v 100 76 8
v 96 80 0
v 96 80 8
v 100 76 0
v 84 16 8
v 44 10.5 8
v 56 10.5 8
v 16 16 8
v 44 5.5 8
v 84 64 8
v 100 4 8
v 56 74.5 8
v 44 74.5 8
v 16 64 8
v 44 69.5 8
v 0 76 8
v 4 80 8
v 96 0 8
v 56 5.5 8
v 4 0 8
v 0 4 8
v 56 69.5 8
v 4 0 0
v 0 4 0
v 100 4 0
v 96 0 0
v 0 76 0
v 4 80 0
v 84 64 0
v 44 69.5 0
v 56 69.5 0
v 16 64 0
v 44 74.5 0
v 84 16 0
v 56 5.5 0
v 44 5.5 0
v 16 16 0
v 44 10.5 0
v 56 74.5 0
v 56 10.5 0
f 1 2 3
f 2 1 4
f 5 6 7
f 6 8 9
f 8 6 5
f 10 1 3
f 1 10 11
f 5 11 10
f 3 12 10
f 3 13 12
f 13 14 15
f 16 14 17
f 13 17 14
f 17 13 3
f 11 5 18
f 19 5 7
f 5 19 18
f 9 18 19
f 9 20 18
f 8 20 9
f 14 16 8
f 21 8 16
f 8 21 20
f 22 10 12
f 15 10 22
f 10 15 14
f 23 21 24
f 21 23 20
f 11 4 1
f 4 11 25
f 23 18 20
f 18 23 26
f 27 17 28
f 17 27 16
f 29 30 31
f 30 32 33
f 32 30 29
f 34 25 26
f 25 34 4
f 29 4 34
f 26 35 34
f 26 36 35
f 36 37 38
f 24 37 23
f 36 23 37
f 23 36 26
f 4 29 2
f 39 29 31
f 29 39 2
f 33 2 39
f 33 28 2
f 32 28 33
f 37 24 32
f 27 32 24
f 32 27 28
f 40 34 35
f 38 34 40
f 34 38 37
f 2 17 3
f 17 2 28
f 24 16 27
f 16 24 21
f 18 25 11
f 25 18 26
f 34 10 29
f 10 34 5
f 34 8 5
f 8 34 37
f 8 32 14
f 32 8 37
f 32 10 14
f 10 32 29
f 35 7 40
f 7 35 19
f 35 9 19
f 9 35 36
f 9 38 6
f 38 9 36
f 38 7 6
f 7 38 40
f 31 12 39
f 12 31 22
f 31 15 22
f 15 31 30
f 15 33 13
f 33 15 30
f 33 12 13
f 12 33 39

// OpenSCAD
$fn = 32;

// ----------------------------------------------------------------------
// Frame plate: 100 x 80 frame, 16 mm rails
// ----------------------------------------------------------------------

// --- parameters (mm) ---
plate_l = 100;            // plate length, X
plate_w = 80;             // plate width, Y
plate_t = 8;              // plate thickness, Z (extrusion height)
corner_c = 4;             // corner chamfer
frame_bar = 16;           // frame rail width
slot_l = 12;              // adjustment slot length
slot_w = 5;               // adjustment slot width

win_l = plate_l - 2 * frame_bar;  // window length
win_w = plate_w - 2 * frame_bar;  // window width

profile = [[4, 0], [96, 0], [100, 4], [100, 76], [96, 80], [4, 80], [0, 76], [0, 4]];  // primary outline, 8 points, counter clockwise
void_1 = [[16, 16], [84, 16], [84, 64], [16, 64]];  // the window, 4 points
void_2 = [[44, 5.5], [56, 5.5], [56, 10.5], [44, 10.5]];  // adjustment slot, 4 points
void_3 = [[44, 69.5], [56, 69.5], [56, 74.5], [44, 74.5]];  // adjustment slot, 4 points

// --- the one profile operation ---
difference() {
  linear_extrude(height = plate_t) polygon(points = profile);
  translate([0, 0, -1])
    linear_extrude(height = plate_t + 2) polygon(points = void_1);
  translate([0, 0, -1])
    linear_extrude(height = plate_t + 2) polygon(points = void_2);
  translate([0, 0, -1])
    linear_extrude(height = plate_t + 2) polygon(points = void_3);
}
